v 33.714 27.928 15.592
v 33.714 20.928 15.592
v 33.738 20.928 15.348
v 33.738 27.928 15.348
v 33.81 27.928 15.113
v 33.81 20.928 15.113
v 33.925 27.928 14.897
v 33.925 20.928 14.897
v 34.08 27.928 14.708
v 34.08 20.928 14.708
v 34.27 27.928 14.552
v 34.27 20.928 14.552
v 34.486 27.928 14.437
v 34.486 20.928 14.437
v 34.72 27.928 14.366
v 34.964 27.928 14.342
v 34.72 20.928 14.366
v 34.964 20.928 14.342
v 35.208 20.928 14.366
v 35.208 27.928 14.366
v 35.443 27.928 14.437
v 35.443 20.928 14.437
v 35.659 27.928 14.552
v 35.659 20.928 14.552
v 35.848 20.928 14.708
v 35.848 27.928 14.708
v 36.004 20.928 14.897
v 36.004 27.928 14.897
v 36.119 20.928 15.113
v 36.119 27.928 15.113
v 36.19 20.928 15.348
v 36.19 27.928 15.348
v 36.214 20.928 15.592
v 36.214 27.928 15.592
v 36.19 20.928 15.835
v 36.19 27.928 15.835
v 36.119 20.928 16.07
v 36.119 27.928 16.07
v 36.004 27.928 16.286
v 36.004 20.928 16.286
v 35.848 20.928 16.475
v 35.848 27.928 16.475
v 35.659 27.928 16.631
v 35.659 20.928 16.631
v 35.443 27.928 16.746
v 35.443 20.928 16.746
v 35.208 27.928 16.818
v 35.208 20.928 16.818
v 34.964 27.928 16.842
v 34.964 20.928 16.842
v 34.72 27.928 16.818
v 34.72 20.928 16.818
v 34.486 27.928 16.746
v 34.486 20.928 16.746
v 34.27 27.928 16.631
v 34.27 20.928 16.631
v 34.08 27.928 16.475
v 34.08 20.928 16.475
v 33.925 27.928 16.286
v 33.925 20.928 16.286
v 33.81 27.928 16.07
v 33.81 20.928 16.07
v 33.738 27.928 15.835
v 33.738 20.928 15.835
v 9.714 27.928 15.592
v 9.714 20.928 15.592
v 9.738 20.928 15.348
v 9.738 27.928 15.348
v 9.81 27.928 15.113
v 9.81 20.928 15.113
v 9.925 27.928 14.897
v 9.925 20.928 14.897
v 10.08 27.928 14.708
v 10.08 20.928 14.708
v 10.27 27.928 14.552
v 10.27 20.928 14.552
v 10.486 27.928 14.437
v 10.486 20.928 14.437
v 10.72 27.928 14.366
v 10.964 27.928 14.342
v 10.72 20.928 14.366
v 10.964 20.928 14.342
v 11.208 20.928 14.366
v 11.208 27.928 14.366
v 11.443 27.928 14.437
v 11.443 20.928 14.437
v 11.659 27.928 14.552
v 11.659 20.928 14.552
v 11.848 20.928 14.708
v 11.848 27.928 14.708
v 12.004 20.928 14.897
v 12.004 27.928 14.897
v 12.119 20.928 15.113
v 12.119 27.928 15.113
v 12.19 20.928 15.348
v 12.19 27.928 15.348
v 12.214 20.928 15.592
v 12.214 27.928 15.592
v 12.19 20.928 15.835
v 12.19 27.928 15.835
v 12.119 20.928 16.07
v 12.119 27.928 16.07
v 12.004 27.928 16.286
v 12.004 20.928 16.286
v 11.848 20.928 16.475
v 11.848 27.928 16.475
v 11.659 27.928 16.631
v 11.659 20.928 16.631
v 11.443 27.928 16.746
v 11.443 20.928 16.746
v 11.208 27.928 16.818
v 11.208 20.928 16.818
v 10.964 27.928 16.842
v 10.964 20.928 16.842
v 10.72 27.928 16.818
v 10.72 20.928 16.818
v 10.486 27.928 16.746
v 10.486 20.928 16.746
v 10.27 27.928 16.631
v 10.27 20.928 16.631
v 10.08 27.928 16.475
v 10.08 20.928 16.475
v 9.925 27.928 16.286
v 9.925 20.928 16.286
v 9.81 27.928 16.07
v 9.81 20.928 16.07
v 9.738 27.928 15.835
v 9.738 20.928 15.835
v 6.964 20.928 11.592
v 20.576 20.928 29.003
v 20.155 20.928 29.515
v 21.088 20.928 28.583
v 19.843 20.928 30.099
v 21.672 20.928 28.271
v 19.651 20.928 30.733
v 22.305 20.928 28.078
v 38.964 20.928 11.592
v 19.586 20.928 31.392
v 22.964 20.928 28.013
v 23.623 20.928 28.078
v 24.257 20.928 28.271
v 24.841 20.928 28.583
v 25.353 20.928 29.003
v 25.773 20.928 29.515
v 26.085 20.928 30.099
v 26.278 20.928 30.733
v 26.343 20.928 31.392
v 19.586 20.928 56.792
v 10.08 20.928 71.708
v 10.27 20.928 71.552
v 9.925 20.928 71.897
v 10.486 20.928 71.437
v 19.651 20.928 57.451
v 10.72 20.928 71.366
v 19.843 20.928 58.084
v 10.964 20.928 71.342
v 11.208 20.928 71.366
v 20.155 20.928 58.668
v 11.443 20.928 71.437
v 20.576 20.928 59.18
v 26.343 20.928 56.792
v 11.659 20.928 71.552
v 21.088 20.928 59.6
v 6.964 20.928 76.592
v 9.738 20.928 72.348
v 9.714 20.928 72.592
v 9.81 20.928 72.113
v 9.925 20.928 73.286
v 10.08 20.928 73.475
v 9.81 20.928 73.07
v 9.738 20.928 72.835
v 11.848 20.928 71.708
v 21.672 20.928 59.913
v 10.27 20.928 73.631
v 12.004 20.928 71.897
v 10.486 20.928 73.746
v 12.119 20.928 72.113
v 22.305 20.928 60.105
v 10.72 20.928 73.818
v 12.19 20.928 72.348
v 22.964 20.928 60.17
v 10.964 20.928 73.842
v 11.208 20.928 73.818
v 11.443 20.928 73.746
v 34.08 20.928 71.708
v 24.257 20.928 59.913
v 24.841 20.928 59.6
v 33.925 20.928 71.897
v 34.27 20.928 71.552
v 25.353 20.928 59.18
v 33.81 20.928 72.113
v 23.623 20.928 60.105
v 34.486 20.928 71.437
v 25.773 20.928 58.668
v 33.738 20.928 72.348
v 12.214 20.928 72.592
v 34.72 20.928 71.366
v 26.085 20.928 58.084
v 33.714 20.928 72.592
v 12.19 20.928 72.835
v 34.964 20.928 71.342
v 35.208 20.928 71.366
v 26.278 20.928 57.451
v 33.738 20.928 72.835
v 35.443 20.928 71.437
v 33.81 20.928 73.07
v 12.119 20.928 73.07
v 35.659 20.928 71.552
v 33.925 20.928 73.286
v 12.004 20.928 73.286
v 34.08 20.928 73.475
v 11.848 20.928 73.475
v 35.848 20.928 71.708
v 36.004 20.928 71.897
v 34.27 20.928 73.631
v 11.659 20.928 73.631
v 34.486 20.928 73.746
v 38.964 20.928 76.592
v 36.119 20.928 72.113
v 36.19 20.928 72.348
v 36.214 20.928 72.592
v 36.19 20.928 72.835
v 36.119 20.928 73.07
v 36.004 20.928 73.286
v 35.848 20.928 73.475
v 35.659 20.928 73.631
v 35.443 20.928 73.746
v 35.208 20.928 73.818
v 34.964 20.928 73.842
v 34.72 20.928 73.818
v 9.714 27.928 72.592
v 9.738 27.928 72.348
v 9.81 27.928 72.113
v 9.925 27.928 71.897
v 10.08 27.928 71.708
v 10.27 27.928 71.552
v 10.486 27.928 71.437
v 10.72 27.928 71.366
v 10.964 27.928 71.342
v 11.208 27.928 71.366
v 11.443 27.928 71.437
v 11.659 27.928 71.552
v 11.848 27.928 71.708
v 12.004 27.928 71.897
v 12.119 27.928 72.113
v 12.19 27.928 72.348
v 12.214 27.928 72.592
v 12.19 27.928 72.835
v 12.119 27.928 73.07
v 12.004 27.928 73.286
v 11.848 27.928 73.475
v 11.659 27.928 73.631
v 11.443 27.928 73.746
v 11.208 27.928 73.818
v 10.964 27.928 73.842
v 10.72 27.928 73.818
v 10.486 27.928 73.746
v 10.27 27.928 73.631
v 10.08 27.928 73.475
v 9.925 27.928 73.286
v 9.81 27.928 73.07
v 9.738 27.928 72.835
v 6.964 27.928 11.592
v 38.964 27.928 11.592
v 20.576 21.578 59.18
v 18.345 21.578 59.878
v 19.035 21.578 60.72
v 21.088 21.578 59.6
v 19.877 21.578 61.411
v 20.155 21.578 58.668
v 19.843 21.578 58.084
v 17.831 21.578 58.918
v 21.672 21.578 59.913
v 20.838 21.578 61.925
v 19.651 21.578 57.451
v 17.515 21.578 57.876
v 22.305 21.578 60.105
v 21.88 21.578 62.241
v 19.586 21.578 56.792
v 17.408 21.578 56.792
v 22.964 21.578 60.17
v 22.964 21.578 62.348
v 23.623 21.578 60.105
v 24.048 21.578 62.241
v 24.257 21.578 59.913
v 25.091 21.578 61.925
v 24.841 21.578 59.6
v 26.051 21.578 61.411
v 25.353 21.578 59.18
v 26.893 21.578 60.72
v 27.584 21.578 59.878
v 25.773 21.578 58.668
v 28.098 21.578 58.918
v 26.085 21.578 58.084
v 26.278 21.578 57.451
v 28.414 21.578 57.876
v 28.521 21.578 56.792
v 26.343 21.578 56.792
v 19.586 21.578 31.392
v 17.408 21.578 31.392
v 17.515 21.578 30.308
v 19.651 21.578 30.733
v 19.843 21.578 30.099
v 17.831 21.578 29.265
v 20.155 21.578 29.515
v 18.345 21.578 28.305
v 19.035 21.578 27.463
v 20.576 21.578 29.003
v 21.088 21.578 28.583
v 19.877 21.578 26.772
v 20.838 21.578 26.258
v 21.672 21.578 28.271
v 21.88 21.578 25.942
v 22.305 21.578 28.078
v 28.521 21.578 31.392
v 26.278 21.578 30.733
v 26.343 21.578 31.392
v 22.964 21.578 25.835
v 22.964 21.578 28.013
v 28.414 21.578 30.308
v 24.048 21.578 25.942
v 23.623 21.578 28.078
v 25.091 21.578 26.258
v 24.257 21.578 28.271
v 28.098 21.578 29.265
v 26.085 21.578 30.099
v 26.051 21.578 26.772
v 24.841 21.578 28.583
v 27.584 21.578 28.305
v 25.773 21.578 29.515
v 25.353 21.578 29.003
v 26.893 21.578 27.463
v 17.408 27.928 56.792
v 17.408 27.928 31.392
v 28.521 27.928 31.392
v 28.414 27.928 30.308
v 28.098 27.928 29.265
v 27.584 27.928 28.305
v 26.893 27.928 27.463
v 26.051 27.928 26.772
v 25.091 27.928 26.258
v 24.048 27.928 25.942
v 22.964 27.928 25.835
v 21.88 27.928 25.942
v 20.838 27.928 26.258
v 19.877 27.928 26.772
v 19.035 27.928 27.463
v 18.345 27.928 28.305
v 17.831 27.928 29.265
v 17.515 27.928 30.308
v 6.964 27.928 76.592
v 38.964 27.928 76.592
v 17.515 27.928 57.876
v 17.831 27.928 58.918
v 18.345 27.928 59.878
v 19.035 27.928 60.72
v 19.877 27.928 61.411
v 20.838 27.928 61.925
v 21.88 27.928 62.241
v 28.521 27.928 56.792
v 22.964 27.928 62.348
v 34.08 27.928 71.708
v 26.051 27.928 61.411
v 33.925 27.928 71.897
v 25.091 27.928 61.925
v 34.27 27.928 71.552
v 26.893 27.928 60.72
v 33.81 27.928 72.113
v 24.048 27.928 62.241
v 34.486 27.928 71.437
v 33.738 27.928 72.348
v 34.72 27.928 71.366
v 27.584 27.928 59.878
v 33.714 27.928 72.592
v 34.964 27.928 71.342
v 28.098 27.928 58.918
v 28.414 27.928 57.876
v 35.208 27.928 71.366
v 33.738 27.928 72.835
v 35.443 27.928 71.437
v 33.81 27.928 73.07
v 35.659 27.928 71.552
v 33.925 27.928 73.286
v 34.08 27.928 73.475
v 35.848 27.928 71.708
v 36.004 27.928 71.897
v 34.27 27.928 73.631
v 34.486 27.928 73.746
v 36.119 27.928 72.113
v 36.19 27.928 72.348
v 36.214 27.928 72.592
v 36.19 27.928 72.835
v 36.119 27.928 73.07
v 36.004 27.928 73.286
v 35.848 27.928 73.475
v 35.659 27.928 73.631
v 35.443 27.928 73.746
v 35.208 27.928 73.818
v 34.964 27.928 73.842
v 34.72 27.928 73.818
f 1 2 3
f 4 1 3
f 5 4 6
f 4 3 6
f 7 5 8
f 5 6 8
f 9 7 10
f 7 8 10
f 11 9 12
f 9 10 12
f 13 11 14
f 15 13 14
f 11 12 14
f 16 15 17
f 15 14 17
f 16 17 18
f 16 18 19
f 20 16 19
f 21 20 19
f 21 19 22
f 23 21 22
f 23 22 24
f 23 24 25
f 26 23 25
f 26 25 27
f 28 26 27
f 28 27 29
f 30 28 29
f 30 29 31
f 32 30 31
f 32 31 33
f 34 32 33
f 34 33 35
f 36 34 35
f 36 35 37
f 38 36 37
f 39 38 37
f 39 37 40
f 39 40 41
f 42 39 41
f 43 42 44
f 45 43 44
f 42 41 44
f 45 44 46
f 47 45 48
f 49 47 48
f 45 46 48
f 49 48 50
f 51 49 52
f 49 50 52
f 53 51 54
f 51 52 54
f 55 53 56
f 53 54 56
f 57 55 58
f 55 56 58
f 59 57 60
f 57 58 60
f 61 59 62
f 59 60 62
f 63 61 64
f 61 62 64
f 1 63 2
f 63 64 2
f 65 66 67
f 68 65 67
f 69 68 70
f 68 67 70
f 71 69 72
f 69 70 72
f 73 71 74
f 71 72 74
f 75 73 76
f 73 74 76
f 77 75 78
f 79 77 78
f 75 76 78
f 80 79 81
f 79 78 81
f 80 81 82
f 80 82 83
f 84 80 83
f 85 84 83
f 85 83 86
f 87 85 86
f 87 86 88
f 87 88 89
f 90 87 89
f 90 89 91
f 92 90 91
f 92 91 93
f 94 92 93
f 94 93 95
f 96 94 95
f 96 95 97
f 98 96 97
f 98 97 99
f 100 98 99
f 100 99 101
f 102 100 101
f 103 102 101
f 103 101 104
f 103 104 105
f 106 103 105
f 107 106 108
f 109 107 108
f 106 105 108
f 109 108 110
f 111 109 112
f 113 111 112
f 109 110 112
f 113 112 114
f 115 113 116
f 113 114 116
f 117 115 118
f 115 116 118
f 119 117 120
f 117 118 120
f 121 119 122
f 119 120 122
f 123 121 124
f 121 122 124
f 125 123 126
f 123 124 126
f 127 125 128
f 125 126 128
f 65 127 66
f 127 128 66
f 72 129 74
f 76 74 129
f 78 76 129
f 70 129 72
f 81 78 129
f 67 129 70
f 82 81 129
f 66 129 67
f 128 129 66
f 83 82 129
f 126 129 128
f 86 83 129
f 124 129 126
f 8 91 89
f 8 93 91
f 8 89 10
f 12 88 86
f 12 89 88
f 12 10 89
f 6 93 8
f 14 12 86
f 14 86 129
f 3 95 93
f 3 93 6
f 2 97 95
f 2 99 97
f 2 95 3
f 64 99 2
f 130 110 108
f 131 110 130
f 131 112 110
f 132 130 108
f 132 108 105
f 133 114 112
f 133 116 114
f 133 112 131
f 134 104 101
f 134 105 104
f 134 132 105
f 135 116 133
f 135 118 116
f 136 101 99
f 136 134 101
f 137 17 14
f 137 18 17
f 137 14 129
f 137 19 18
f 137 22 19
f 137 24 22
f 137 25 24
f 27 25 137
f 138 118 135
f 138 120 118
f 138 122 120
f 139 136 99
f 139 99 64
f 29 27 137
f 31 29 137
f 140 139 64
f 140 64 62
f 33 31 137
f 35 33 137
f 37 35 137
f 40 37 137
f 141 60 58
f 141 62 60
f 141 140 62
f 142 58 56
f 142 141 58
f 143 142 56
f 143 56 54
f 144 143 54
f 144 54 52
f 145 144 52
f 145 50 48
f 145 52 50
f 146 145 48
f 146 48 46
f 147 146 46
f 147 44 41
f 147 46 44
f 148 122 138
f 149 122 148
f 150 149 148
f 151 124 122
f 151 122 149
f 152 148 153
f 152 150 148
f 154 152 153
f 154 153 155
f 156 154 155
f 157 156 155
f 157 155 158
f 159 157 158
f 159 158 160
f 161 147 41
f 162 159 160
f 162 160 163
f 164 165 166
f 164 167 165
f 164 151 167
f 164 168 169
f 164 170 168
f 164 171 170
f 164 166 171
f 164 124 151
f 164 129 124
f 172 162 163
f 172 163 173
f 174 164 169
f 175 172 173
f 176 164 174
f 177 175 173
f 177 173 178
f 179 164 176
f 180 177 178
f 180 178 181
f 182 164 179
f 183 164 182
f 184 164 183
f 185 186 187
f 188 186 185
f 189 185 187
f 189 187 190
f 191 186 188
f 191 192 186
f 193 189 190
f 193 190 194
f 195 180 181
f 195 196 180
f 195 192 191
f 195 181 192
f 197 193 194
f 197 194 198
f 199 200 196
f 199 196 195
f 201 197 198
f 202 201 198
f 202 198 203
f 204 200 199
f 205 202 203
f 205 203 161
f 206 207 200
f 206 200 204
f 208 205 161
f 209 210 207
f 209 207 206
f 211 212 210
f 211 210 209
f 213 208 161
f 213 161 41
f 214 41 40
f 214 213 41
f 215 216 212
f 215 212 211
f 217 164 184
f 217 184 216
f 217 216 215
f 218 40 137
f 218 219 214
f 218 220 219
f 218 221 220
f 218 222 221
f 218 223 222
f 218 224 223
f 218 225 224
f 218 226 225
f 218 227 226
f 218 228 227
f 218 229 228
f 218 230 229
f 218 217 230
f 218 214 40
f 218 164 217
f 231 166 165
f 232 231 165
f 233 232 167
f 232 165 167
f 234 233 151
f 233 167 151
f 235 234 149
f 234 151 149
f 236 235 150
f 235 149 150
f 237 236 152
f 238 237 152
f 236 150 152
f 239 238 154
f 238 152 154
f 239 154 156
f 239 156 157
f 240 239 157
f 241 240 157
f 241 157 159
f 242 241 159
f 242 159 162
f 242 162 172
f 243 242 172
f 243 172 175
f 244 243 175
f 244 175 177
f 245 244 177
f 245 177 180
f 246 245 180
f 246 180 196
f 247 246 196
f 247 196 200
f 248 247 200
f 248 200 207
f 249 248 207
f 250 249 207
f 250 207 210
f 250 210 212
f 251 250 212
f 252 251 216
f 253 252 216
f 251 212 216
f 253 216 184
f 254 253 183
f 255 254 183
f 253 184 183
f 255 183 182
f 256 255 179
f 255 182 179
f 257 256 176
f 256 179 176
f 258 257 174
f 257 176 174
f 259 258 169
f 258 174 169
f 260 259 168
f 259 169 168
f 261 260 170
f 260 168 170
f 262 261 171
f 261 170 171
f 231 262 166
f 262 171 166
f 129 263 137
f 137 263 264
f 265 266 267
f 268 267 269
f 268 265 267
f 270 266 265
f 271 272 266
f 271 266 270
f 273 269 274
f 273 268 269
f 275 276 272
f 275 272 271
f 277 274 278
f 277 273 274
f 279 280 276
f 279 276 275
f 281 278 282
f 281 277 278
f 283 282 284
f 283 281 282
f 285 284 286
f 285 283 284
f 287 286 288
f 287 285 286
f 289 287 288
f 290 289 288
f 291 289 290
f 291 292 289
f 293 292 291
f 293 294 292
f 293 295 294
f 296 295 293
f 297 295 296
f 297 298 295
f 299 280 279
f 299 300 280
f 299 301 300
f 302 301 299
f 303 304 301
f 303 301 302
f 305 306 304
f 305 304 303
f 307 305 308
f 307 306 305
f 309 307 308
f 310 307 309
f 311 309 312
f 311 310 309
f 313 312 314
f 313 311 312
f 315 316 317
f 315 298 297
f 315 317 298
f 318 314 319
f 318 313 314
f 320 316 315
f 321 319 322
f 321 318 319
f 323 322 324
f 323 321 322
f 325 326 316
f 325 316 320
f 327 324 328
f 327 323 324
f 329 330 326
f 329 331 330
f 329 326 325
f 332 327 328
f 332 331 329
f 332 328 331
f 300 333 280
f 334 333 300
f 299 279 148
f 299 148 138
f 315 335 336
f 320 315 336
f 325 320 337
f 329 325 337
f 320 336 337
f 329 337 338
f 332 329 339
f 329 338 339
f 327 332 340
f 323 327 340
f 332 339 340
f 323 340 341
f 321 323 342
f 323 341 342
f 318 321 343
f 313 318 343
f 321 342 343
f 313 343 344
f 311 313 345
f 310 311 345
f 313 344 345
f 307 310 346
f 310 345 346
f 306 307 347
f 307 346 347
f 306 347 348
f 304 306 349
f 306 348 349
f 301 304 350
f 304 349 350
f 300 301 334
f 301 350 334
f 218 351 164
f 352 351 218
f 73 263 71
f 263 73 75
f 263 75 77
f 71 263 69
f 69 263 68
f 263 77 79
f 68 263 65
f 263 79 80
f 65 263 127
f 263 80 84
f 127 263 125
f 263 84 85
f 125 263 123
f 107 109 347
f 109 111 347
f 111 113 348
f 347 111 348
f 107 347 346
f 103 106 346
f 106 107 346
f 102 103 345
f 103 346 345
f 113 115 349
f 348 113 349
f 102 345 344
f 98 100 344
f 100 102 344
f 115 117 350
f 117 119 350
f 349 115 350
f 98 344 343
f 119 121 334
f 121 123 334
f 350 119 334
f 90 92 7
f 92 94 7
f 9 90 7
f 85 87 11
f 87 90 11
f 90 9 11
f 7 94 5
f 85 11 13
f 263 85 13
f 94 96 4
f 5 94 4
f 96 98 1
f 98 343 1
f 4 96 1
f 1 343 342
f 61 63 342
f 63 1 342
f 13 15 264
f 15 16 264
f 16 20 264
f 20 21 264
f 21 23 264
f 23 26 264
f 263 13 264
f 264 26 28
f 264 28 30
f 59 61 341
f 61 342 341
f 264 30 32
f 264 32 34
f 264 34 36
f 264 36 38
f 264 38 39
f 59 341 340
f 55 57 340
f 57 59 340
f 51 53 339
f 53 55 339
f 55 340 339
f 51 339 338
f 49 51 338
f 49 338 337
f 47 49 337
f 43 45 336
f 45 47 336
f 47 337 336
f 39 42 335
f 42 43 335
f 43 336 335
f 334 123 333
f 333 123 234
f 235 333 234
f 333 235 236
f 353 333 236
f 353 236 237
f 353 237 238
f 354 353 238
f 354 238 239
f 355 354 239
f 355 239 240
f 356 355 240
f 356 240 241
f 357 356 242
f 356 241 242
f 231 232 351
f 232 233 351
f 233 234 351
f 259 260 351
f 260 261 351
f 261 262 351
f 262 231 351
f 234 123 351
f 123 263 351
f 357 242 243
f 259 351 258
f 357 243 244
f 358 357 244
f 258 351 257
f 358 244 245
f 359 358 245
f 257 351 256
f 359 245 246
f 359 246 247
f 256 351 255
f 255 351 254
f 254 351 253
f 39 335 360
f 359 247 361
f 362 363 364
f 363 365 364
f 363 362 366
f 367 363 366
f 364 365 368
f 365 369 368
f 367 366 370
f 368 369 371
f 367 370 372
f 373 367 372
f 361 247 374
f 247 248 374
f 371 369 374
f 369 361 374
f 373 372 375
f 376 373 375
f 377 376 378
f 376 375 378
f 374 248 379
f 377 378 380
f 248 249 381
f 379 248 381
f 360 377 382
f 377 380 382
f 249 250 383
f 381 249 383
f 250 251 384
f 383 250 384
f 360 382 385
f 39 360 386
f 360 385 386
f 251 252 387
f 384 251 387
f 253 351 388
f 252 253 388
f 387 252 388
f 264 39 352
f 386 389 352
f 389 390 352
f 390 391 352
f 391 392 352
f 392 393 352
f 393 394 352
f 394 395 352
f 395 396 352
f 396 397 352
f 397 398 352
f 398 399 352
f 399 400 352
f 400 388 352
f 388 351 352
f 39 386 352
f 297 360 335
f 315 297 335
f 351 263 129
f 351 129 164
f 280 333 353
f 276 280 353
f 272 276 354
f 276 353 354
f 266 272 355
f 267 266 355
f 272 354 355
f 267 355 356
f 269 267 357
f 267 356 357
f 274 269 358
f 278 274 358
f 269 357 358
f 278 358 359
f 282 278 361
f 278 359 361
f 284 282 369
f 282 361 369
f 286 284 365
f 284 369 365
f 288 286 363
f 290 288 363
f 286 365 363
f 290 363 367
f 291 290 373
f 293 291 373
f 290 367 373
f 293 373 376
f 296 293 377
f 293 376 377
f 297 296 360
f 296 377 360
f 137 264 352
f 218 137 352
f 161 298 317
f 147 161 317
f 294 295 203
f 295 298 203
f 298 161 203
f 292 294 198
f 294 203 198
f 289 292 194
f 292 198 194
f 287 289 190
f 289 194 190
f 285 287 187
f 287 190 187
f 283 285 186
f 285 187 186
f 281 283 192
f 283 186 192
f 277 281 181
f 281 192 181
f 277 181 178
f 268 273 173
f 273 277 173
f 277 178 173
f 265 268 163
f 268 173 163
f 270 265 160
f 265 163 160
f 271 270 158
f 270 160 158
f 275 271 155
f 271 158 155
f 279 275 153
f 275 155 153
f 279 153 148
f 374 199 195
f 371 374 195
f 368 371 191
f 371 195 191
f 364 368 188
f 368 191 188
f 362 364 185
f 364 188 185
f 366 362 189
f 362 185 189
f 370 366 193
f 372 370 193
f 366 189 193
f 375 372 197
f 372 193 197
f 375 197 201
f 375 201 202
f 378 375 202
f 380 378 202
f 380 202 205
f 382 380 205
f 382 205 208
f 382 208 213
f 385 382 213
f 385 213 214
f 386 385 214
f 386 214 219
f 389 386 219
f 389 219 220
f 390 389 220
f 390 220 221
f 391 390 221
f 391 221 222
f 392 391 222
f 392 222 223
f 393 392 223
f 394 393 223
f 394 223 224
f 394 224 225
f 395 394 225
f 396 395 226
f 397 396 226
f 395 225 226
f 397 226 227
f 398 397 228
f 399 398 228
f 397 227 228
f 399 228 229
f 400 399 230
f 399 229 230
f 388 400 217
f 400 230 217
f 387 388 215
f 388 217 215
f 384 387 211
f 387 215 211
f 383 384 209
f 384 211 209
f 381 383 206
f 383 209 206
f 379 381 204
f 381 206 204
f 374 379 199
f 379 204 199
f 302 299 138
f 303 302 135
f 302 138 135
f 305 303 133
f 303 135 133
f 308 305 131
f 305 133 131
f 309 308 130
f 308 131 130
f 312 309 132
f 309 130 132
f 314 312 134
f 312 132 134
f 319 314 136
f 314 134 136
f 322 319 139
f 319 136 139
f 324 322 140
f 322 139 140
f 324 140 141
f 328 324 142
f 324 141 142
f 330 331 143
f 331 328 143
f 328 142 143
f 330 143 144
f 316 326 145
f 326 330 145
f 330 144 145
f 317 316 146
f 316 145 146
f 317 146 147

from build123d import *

# Parameters (mm, degrees)
SKETCH1_W                                        = 32
SKETCH1_H                                        = 65
BOSS_EXTRUDE1_DEPTH                              = 7
TAP_DRILL_FOR_M3X0_5_TAP1_D                      = 2.5
CBORE_FOR_1_4_SOCKET_HEAD_CAP_SCREW1_D           = 6.7564
CBORE_FOR_1_4_SOCKET_HEAD_CAP_SCREW1_CBORE_D     = 11.1125
CBORE_FOR_1_4_SOCKET_HEAD_CAP_SCREW1_CBORE_DEPTH = 6.35
SKETCH6_W                                        = 11.1125
SKETCH6_H                                        = 25.4
CUT_EXTRUDE1_DEPTH                               = 6.35
SKETCH7_W                                        = 6.7564
SKETCH7_H                                        = 25.4
CUT_EXTRUDE2_DEPTH                               = 87.167337251


with BuildPart() as part:
    # Sketch1 → Boss-Extrude1 (new body)
    with BuildSketch(Plane.XZ.offset(-27.928124556)):
        with Locations((22.96435644, 44.091555907)):
            Rectangle(SKETCH1_W, SKETCH1_H)
    extrude(amount=BOSS_EXTRUDE1_DEPTH)

    # Tap Drill for M3x0.5 Tap1 (through all)
    with Locations(Plane(origin=(0, 27.928124556, 0), x_dir=(1, 0, 0), z_dir=(0, 1, 0))):
        with Locations((10.96435606, -15.591555987), (34.96435632, -15.591555987), (34.96435632, -72.591556287), (10.96435606, -72.591556287)):
            Hole(TAP_DRILL_FOR_M3X0_5_TAP1_D / 2)

    # CBORE for 1/4 Socket Head Cap Screw1 (through all)
    with Locations(Plane(origin=(0, 27.928124556, 0), x_dir=(1, 0, 0), z_dir=(0, 1, 0))):
        with Locations((22.96435644, -31.391555907), (22.96435644, -56.791555907)):
            CounterBoreHole(CBORE_FOR_1_4_SOCKET_HEAD_CAP_SCREW1_D / 2, CBORE_FOR_1_4_SOCKET_HEAD_CAP_SCREW1_CBORE_D / 2, CBORE_FOR_1_4_SOCKET_HEAD_CAP_SCREW1_CBORE_DEPTH)

    # Sketch6 → Cut-Extrude1 (cut)
    with BuildSketch(Plane(origin=(0, 27.928124556, 0), x_dir=(1, 0, 0), z_dir=(0, 1, 0))):
        with Locations((22.96435644, -44.091555907)):
            Rectangle(SKETCH6_W, SKETCH6_H)
    extrude(amount=-CUT_EXTRUDE1_DEPTH, mode=Mode.SUBTRACT)

    # Sketch7 → Cut-Extrude2 (cut, through all)
    with BuildSketch(Plane(origin=(0, 21.578124556, 0), x_dir=(1, 0, 0), z_dir=(0, 1, 0))):
        with Locations((22.96435644, -44.091555907)):
            Rectangle(SKETCH7_W, SKETCH7_H)
    extrude(amount=-CUT_EXTRUDE2_DEPTH, mode=Mode.SUBTRACT)


solid = part.part
